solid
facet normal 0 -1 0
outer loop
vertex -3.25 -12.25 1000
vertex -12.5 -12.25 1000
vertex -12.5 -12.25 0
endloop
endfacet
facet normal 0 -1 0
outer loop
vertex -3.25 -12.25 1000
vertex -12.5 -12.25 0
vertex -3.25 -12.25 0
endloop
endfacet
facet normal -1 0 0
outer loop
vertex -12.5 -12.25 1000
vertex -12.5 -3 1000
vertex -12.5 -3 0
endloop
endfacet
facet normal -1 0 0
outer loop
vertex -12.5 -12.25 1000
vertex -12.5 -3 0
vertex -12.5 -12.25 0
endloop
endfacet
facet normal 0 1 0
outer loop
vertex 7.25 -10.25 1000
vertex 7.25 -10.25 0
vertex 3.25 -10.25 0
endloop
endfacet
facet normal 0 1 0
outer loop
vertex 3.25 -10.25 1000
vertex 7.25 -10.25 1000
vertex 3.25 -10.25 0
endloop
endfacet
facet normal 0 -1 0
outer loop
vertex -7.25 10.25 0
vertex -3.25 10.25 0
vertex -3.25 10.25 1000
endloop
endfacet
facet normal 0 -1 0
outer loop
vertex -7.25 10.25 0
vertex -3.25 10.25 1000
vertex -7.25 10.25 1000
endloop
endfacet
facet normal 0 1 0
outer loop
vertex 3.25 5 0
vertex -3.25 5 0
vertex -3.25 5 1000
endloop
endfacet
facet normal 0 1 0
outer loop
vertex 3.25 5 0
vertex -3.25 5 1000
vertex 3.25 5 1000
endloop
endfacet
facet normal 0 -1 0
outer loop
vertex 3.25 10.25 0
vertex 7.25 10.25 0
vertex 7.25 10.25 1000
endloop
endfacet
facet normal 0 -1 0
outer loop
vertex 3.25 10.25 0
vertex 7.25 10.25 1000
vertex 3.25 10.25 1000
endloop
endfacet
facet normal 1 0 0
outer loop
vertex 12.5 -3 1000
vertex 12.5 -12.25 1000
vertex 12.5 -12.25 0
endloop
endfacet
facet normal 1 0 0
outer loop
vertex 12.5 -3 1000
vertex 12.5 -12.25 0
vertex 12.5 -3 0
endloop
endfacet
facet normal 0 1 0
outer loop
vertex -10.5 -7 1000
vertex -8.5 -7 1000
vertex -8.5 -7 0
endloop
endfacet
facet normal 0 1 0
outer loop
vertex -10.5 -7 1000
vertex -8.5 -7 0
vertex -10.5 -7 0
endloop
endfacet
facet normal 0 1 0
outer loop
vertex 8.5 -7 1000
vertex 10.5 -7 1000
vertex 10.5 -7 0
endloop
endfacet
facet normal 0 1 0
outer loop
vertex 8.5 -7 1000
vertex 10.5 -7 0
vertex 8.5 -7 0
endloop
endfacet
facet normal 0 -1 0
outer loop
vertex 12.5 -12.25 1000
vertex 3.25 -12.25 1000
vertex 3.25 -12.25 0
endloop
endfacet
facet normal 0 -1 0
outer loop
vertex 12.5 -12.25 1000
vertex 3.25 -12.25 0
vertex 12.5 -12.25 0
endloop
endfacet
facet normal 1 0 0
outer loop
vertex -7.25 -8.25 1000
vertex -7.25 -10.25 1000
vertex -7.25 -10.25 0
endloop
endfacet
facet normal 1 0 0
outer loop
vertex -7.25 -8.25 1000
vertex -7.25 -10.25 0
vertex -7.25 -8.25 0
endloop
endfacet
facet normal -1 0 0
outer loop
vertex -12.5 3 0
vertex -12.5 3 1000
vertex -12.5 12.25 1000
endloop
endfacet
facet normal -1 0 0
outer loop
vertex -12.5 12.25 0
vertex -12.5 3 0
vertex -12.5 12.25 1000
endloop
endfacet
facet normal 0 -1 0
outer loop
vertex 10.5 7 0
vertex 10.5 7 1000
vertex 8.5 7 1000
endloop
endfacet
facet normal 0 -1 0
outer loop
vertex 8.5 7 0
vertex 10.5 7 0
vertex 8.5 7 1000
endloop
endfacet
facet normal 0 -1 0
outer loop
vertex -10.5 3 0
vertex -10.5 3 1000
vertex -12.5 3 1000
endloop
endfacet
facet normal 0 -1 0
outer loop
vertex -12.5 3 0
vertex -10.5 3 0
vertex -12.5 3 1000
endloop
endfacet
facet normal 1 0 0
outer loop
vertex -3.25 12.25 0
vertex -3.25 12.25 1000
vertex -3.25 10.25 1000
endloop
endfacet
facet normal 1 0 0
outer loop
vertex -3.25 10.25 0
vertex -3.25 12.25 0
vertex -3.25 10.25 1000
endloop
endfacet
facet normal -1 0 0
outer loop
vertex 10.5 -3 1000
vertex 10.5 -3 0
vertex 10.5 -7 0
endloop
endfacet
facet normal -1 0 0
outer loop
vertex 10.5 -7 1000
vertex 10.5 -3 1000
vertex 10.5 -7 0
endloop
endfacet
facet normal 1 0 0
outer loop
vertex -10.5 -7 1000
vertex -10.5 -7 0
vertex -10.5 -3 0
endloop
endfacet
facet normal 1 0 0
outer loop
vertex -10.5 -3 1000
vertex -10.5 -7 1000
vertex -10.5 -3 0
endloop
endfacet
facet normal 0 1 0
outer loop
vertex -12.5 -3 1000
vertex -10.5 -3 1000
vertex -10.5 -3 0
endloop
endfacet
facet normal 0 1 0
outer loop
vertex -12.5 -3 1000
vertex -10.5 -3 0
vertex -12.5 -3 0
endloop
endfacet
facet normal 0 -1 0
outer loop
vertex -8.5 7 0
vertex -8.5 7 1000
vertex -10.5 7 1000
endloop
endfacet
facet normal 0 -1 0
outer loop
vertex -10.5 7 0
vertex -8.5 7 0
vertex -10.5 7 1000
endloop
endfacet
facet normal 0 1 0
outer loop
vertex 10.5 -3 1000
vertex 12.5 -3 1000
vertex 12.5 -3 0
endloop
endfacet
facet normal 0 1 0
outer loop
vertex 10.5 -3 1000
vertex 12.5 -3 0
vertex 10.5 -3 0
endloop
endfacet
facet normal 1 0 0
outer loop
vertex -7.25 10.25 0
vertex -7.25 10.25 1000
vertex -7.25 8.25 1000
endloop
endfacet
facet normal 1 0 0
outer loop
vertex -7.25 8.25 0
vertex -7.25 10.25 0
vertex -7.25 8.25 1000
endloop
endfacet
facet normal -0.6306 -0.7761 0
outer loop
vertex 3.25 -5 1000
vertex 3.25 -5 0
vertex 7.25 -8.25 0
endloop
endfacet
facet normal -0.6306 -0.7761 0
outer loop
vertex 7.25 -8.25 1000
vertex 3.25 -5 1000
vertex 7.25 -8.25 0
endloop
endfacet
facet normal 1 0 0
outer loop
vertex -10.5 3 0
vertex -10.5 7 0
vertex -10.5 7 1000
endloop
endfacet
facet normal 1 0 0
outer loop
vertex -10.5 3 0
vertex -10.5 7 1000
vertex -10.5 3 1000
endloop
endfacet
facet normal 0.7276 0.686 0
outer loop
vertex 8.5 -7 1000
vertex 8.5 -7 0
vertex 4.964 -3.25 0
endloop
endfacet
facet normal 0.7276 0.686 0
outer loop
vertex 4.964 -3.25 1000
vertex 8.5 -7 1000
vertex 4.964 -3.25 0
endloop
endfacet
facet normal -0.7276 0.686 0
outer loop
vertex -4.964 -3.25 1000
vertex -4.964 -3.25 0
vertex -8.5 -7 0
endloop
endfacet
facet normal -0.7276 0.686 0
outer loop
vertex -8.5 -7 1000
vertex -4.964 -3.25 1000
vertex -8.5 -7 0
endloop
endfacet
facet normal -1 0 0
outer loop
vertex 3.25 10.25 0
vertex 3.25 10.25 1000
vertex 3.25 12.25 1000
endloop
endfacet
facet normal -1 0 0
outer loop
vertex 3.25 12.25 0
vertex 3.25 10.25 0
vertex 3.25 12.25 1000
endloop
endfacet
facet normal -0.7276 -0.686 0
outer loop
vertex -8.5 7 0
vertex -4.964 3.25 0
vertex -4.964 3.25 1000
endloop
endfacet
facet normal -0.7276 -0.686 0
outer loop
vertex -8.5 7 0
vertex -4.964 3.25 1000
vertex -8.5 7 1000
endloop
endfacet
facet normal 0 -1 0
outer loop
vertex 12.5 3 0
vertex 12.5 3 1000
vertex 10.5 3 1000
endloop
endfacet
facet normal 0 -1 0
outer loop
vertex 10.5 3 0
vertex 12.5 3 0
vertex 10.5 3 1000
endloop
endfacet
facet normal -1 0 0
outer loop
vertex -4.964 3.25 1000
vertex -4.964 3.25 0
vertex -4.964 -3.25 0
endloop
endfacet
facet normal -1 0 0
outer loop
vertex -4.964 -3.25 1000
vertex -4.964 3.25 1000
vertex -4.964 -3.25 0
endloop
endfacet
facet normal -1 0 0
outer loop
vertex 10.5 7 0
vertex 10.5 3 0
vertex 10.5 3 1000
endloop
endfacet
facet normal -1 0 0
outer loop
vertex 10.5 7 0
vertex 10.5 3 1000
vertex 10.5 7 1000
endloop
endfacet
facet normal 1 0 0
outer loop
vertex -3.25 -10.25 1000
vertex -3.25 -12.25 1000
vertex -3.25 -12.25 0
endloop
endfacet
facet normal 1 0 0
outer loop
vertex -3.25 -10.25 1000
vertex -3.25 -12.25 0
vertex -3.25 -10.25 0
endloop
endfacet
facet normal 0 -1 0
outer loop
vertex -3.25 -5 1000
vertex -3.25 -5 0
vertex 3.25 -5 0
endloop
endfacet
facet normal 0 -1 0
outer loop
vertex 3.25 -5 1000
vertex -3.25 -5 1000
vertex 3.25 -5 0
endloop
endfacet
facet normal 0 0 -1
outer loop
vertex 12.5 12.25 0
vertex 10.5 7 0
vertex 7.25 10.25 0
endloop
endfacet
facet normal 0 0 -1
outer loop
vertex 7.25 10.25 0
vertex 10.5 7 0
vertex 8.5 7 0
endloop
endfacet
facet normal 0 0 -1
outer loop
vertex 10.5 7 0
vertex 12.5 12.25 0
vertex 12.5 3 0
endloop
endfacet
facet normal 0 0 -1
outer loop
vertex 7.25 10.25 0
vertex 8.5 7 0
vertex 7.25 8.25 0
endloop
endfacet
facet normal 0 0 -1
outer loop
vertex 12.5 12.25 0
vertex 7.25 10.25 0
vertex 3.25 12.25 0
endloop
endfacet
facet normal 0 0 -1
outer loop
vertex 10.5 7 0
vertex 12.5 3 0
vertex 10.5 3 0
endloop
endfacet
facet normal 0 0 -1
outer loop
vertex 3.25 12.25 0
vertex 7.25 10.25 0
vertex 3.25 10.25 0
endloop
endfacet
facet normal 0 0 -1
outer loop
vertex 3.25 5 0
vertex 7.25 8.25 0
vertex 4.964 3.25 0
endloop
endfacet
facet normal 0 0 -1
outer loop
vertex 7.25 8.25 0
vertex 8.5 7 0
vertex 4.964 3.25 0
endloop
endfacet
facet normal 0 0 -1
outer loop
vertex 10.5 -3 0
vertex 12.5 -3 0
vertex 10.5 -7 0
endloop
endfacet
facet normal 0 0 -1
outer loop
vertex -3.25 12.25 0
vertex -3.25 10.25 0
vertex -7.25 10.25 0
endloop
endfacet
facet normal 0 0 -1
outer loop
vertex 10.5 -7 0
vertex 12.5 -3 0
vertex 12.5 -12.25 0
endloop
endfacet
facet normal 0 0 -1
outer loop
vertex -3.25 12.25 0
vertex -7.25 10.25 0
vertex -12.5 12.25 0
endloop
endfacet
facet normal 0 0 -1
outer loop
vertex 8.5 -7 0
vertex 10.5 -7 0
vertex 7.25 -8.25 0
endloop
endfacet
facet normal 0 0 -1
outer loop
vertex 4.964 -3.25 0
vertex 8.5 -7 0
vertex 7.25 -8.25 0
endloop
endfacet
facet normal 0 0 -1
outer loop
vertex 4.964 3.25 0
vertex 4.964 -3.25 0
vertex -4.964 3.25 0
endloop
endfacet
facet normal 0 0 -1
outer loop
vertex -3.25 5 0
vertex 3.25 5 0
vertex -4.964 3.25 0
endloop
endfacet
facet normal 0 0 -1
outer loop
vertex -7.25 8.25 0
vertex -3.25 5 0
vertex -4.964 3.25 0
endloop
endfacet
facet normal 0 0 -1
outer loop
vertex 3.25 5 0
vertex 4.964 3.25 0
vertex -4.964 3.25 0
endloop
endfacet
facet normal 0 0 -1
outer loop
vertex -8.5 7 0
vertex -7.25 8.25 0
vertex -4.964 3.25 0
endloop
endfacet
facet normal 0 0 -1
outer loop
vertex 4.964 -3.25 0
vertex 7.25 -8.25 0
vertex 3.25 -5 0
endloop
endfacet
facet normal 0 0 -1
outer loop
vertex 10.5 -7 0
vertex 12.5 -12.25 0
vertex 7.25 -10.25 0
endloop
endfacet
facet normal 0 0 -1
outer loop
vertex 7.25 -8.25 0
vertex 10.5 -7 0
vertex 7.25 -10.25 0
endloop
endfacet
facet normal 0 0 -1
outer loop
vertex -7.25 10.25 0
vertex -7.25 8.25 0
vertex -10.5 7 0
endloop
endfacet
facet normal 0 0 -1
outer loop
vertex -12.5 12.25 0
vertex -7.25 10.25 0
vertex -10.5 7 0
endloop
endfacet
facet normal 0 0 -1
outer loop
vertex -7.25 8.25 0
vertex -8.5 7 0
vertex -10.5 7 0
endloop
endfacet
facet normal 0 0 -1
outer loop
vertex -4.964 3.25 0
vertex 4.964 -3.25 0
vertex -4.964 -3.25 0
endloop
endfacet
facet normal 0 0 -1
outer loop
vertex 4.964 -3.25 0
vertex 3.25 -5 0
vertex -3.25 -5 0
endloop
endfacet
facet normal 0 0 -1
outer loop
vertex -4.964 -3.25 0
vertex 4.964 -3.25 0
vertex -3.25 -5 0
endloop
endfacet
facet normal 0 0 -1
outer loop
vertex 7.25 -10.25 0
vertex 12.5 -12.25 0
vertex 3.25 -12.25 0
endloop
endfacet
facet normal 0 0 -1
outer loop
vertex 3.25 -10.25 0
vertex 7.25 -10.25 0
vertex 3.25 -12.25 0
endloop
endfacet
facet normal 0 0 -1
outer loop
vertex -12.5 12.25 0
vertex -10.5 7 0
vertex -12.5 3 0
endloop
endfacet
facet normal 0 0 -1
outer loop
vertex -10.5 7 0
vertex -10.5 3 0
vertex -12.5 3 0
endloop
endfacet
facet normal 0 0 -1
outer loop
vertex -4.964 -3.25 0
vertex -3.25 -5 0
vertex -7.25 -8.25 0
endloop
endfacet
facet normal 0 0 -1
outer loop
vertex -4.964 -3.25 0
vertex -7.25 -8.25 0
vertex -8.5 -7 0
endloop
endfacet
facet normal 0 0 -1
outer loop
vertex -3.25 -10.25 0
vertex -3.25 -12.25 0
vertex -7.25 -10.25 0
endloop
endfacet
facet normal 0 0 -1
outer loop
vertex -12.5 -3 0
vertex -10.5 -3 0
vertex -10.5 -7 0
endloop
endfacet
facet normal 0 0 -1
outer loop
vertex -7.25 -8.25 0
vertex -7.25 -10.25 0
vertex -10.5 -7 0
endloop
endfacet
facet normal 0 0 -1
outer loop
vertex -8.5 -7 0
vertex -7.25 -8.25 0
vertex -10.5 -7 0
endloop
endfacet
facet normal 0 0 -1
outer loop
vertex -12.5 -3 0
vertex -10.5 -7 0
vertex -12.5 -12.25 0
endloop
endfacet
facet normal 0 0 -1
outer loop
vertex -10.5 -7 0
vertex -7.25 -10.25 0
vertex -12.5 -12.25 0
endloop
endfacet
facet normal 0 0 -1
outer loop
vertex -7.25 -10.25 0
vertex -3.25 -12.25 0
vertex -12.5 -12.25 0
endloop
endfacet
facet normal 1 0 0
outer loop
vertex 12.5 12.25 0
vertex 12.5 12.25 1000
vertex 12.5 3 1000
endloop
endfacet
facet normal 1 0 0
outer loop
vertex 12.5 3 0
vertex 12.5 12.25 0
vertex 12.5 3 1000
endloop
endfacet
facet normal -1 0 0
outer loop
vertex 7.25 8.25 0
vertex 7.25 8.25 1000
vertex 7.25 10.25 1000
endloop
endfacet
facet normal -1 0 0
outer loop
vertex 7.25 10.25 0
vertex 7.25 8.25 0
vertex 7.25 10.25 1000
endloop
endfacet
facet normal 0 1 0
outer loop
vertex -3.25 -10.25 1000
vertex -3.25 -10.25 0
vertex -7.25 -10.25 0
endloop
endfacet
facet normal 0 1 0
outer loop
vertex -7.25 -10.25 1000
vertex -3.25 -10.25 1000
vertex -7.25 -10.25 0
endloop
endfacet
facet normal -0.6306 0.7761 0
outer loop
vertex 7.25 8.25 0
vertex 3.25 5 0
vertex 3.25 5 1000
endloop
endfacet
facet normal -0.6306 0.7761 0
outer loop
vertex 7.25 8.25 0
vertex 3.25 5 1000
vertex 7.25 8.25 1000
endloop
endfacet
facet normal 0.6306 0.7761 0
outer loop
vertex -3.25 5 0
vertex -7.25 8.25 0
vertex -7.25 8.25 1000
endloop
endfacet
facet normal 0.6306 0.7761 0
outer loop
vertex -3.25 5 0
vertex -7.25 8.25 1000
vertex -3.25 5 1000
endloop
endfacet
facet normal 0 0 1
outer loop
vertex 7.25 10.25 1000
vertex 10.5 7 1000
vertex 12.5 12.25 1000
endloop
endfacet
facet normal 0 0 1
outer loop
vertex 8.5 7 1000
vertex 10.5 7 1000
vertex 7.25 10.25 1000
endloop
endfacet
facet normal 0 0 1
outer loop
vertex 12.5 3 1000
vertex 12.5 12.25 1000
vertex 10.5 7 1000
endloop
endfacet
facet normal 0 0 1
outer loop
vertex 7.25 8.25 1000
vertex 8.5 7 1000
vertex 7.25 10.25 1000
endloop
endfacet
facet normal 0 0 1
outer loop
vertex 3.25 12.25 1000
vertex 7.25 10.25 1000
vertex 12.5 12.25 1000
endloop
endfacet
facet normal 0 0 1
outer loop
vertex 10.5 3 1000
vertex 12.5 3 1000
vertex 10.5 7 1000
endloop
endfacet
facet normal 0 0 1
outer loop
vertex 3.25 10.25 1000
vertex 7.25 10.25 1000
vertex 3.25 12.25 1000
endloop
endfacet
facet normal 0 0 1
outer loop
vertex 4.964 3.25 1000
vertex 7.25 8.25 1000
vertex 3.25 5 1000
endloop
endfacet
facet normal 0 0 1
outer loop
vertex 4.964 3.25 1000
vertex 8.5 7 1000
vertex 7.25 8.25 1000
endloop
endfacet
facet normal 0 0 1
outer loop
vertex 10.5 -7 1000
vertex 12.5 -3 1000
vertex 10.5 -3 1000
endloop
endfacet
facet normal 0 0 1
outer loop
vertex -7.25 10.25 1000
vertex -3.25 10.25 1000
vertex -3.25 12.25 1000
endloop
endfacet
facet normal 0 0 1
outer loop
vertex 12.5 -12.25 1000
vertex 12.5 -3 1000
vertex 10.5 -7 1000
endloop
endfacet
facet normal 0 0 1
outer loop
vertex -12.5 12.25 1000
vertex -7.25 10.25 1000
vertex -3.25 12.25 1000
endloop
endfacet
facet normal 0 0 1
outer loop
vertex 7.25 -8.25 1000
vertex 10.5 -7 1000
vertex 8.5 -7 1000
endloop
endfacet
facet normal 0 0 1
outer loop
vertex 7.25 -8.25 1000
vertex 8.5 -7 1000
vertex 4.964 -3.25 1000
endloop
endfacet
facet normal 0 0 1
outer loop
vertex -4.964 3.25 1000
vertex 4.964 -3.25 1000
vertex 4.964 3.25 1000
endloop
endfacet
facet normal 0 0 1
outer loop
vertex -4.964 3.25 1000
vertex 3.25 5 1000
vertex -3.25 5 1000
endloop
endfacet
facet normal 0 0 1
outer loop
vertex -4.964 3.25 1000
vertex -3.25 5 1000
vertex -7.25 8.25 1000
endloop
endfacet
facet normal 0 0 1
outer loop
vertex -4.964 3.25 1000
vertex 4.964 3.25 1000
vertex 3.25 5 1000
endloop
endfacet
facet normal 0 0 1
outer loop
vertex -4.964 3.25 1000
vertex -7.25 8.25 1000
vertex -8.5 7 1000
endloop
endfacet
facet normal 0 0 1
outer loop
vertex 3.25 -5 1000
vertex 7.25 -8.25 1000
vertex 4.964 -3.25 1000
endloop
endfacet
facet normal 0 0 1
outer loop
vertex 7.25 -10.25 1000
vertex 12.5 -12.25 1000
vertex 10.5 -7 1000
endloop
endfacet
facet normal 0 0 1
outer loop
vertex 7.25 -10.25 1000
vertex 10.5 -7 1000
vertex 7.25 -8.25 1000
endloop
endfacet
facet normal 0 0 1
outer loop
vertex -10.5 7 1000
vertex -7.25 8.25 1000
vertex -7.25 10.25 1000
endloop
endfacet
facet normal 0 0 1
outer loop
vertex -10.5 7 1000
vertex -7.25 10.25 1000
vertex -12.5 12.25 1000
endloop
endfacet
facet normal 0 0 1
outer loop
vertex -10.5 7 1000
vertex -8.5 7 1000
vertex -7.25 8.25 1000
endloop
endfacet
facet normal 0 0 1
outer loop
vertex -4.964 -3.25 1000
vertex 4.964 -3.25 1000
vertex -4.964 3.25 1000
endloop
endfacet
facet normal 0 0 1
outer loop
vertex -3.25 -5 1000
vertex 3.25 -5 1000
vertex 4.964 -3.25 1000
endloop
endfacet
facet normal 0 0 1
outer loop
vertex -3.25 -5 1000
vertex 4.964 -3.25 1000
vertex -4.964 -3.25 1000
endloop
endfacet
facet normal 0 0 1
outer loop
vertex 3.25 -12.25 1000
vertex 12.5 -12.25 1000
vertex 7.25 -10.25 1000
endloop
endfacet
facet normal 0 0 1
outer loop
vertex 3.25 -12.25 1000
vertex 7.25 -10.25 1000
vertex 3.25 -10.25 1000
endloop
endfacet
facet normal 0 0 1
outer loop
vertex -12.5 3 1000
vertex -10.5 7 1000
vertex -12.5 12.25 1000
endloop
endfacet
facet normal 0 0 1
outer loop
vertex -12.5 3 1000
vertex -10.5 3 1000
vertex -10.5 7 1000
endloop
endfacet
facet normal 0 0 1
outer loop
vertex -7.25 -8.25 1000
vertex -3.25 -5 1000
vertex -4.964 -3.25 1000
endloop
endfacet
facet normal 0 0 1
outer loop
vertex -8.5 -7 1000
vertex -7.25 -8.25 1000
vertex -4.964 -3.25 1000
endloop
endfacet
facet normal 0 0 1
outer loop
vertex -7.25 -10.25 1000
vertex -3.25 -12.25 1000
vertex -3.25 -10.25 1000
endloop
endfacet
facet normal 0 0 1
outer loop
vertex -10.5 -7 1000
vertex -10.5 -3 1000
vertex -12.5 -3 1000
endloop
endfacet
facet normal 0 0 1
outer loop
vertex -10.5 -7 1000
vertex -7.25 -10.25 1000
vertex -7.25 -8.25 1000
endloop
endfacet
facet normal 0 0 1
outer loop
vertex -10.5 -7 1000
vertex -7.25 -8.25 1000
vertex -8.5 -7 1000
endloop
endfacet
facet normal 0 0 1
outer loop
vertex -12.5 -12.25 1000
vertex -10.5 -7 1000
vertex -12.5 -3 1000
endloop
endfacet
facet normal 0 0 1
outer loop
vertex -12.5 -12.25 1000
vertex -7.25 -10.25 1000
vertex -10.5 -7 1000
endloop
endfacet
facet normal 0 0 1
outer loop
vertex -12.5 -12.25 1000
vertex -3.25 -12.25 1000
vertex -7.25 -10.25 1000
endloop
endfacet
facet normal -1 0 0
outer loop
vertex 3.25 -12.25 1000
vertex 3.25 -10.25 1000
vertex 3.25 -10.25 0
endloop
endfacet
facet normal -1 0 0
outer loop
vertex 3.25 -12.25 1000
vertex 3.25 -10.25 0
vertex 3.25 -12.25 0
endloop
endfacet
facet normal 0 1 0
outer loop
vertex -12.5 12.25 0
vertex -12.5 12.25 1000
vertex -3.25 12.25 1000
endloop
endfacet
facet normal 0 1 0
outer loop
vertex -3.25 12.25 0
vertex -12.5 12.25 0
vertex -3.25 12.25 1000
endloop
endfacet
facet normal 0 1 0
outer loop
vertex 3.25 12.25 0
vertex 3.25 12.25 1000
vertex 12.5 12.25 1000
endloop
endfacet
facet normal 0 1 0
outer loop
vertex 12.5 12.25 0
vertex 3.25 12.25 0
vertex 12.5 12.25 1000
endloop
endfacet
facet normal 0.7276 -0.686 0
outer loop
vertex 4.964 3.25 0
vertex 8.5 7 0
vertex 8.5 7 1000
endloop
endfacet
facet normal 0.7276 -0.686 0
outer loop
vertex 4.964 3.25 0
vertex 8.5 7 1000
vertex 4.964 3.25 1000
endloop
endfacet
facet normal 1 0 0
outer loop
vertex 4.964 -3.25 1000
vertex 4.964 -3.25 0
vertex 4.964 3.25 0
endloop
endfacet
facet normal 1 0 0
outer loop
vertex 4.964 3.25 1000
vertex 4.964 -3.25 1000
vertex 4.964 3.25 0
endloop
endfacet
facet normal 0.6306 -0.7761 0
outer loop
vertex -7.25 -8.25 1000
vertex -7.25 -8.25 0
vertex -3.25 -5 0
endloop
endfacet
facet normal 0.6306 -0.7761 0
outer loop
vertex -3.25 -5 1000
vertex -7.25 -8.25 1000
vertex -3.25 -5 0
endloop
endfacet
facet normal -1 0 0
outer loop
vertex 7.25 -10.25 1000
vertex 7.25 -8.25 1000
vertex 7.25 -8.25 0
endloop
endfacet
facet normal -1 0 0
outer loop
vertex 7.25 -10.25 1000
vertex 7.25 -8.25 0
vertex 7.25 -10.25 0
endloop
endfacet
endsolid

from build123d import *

# Parameters (mm, degrees)
PAD_DEPTH    = 1000
SKETCH001_R  = 2
POCKET_DEPTH = 5.251


with BuildPart() as change_me_for_height:
    # Sketch → Pad (new body)
    with BuildSketch(Plane.XY):
        Polygon((-12.5, 3), (-12.5, 12.25), (-3.25, 12.25), (-3.25, 10.25), (-7.25, 10.25), (-7.25, 8.25), (-3.25, 5), (3.25, 5), (7.25, 8.25), (7.25, 10.25), (3.25, 10.25), (3.25, 12.25), (12.5, 12.25), (12.5, 3), (10.5, 3), (10.5, 7), (8.5, 7), (4.964466, 3.25), (4.964466, 0), (-4.964466, 0), (-4.964466, 3.25), (-8.5, 7), (-10.5, 7), (-10.5, 3), align=None)
    pad = extrude(amount=PAD_DEPTH)


with BuildPart() as mirrored:
    # Mirrored base: copy of Change_me_for_height
    add(change_me_for_height.part)

    # Mirrored: Pad across Sketch H_Axis
    add(pad.mirror(Plane.ZX))


with BuildPart() as pocket:
    # Fusion base: copy of Change_me_for_height
    add(change_me_for_height.part)

    # Fusion: union Mirrored
    add(mirrored.part)

    # Sketch001 → Pocket (cut, through all)
    with BuildSketch(Plane.XZ.offset(-7)):
        Circle(SKETCH001_R)
    extrude(amount=-POCKET_DEPTH, mode=Mode.SUBTRACT)


solid = pocket.part
